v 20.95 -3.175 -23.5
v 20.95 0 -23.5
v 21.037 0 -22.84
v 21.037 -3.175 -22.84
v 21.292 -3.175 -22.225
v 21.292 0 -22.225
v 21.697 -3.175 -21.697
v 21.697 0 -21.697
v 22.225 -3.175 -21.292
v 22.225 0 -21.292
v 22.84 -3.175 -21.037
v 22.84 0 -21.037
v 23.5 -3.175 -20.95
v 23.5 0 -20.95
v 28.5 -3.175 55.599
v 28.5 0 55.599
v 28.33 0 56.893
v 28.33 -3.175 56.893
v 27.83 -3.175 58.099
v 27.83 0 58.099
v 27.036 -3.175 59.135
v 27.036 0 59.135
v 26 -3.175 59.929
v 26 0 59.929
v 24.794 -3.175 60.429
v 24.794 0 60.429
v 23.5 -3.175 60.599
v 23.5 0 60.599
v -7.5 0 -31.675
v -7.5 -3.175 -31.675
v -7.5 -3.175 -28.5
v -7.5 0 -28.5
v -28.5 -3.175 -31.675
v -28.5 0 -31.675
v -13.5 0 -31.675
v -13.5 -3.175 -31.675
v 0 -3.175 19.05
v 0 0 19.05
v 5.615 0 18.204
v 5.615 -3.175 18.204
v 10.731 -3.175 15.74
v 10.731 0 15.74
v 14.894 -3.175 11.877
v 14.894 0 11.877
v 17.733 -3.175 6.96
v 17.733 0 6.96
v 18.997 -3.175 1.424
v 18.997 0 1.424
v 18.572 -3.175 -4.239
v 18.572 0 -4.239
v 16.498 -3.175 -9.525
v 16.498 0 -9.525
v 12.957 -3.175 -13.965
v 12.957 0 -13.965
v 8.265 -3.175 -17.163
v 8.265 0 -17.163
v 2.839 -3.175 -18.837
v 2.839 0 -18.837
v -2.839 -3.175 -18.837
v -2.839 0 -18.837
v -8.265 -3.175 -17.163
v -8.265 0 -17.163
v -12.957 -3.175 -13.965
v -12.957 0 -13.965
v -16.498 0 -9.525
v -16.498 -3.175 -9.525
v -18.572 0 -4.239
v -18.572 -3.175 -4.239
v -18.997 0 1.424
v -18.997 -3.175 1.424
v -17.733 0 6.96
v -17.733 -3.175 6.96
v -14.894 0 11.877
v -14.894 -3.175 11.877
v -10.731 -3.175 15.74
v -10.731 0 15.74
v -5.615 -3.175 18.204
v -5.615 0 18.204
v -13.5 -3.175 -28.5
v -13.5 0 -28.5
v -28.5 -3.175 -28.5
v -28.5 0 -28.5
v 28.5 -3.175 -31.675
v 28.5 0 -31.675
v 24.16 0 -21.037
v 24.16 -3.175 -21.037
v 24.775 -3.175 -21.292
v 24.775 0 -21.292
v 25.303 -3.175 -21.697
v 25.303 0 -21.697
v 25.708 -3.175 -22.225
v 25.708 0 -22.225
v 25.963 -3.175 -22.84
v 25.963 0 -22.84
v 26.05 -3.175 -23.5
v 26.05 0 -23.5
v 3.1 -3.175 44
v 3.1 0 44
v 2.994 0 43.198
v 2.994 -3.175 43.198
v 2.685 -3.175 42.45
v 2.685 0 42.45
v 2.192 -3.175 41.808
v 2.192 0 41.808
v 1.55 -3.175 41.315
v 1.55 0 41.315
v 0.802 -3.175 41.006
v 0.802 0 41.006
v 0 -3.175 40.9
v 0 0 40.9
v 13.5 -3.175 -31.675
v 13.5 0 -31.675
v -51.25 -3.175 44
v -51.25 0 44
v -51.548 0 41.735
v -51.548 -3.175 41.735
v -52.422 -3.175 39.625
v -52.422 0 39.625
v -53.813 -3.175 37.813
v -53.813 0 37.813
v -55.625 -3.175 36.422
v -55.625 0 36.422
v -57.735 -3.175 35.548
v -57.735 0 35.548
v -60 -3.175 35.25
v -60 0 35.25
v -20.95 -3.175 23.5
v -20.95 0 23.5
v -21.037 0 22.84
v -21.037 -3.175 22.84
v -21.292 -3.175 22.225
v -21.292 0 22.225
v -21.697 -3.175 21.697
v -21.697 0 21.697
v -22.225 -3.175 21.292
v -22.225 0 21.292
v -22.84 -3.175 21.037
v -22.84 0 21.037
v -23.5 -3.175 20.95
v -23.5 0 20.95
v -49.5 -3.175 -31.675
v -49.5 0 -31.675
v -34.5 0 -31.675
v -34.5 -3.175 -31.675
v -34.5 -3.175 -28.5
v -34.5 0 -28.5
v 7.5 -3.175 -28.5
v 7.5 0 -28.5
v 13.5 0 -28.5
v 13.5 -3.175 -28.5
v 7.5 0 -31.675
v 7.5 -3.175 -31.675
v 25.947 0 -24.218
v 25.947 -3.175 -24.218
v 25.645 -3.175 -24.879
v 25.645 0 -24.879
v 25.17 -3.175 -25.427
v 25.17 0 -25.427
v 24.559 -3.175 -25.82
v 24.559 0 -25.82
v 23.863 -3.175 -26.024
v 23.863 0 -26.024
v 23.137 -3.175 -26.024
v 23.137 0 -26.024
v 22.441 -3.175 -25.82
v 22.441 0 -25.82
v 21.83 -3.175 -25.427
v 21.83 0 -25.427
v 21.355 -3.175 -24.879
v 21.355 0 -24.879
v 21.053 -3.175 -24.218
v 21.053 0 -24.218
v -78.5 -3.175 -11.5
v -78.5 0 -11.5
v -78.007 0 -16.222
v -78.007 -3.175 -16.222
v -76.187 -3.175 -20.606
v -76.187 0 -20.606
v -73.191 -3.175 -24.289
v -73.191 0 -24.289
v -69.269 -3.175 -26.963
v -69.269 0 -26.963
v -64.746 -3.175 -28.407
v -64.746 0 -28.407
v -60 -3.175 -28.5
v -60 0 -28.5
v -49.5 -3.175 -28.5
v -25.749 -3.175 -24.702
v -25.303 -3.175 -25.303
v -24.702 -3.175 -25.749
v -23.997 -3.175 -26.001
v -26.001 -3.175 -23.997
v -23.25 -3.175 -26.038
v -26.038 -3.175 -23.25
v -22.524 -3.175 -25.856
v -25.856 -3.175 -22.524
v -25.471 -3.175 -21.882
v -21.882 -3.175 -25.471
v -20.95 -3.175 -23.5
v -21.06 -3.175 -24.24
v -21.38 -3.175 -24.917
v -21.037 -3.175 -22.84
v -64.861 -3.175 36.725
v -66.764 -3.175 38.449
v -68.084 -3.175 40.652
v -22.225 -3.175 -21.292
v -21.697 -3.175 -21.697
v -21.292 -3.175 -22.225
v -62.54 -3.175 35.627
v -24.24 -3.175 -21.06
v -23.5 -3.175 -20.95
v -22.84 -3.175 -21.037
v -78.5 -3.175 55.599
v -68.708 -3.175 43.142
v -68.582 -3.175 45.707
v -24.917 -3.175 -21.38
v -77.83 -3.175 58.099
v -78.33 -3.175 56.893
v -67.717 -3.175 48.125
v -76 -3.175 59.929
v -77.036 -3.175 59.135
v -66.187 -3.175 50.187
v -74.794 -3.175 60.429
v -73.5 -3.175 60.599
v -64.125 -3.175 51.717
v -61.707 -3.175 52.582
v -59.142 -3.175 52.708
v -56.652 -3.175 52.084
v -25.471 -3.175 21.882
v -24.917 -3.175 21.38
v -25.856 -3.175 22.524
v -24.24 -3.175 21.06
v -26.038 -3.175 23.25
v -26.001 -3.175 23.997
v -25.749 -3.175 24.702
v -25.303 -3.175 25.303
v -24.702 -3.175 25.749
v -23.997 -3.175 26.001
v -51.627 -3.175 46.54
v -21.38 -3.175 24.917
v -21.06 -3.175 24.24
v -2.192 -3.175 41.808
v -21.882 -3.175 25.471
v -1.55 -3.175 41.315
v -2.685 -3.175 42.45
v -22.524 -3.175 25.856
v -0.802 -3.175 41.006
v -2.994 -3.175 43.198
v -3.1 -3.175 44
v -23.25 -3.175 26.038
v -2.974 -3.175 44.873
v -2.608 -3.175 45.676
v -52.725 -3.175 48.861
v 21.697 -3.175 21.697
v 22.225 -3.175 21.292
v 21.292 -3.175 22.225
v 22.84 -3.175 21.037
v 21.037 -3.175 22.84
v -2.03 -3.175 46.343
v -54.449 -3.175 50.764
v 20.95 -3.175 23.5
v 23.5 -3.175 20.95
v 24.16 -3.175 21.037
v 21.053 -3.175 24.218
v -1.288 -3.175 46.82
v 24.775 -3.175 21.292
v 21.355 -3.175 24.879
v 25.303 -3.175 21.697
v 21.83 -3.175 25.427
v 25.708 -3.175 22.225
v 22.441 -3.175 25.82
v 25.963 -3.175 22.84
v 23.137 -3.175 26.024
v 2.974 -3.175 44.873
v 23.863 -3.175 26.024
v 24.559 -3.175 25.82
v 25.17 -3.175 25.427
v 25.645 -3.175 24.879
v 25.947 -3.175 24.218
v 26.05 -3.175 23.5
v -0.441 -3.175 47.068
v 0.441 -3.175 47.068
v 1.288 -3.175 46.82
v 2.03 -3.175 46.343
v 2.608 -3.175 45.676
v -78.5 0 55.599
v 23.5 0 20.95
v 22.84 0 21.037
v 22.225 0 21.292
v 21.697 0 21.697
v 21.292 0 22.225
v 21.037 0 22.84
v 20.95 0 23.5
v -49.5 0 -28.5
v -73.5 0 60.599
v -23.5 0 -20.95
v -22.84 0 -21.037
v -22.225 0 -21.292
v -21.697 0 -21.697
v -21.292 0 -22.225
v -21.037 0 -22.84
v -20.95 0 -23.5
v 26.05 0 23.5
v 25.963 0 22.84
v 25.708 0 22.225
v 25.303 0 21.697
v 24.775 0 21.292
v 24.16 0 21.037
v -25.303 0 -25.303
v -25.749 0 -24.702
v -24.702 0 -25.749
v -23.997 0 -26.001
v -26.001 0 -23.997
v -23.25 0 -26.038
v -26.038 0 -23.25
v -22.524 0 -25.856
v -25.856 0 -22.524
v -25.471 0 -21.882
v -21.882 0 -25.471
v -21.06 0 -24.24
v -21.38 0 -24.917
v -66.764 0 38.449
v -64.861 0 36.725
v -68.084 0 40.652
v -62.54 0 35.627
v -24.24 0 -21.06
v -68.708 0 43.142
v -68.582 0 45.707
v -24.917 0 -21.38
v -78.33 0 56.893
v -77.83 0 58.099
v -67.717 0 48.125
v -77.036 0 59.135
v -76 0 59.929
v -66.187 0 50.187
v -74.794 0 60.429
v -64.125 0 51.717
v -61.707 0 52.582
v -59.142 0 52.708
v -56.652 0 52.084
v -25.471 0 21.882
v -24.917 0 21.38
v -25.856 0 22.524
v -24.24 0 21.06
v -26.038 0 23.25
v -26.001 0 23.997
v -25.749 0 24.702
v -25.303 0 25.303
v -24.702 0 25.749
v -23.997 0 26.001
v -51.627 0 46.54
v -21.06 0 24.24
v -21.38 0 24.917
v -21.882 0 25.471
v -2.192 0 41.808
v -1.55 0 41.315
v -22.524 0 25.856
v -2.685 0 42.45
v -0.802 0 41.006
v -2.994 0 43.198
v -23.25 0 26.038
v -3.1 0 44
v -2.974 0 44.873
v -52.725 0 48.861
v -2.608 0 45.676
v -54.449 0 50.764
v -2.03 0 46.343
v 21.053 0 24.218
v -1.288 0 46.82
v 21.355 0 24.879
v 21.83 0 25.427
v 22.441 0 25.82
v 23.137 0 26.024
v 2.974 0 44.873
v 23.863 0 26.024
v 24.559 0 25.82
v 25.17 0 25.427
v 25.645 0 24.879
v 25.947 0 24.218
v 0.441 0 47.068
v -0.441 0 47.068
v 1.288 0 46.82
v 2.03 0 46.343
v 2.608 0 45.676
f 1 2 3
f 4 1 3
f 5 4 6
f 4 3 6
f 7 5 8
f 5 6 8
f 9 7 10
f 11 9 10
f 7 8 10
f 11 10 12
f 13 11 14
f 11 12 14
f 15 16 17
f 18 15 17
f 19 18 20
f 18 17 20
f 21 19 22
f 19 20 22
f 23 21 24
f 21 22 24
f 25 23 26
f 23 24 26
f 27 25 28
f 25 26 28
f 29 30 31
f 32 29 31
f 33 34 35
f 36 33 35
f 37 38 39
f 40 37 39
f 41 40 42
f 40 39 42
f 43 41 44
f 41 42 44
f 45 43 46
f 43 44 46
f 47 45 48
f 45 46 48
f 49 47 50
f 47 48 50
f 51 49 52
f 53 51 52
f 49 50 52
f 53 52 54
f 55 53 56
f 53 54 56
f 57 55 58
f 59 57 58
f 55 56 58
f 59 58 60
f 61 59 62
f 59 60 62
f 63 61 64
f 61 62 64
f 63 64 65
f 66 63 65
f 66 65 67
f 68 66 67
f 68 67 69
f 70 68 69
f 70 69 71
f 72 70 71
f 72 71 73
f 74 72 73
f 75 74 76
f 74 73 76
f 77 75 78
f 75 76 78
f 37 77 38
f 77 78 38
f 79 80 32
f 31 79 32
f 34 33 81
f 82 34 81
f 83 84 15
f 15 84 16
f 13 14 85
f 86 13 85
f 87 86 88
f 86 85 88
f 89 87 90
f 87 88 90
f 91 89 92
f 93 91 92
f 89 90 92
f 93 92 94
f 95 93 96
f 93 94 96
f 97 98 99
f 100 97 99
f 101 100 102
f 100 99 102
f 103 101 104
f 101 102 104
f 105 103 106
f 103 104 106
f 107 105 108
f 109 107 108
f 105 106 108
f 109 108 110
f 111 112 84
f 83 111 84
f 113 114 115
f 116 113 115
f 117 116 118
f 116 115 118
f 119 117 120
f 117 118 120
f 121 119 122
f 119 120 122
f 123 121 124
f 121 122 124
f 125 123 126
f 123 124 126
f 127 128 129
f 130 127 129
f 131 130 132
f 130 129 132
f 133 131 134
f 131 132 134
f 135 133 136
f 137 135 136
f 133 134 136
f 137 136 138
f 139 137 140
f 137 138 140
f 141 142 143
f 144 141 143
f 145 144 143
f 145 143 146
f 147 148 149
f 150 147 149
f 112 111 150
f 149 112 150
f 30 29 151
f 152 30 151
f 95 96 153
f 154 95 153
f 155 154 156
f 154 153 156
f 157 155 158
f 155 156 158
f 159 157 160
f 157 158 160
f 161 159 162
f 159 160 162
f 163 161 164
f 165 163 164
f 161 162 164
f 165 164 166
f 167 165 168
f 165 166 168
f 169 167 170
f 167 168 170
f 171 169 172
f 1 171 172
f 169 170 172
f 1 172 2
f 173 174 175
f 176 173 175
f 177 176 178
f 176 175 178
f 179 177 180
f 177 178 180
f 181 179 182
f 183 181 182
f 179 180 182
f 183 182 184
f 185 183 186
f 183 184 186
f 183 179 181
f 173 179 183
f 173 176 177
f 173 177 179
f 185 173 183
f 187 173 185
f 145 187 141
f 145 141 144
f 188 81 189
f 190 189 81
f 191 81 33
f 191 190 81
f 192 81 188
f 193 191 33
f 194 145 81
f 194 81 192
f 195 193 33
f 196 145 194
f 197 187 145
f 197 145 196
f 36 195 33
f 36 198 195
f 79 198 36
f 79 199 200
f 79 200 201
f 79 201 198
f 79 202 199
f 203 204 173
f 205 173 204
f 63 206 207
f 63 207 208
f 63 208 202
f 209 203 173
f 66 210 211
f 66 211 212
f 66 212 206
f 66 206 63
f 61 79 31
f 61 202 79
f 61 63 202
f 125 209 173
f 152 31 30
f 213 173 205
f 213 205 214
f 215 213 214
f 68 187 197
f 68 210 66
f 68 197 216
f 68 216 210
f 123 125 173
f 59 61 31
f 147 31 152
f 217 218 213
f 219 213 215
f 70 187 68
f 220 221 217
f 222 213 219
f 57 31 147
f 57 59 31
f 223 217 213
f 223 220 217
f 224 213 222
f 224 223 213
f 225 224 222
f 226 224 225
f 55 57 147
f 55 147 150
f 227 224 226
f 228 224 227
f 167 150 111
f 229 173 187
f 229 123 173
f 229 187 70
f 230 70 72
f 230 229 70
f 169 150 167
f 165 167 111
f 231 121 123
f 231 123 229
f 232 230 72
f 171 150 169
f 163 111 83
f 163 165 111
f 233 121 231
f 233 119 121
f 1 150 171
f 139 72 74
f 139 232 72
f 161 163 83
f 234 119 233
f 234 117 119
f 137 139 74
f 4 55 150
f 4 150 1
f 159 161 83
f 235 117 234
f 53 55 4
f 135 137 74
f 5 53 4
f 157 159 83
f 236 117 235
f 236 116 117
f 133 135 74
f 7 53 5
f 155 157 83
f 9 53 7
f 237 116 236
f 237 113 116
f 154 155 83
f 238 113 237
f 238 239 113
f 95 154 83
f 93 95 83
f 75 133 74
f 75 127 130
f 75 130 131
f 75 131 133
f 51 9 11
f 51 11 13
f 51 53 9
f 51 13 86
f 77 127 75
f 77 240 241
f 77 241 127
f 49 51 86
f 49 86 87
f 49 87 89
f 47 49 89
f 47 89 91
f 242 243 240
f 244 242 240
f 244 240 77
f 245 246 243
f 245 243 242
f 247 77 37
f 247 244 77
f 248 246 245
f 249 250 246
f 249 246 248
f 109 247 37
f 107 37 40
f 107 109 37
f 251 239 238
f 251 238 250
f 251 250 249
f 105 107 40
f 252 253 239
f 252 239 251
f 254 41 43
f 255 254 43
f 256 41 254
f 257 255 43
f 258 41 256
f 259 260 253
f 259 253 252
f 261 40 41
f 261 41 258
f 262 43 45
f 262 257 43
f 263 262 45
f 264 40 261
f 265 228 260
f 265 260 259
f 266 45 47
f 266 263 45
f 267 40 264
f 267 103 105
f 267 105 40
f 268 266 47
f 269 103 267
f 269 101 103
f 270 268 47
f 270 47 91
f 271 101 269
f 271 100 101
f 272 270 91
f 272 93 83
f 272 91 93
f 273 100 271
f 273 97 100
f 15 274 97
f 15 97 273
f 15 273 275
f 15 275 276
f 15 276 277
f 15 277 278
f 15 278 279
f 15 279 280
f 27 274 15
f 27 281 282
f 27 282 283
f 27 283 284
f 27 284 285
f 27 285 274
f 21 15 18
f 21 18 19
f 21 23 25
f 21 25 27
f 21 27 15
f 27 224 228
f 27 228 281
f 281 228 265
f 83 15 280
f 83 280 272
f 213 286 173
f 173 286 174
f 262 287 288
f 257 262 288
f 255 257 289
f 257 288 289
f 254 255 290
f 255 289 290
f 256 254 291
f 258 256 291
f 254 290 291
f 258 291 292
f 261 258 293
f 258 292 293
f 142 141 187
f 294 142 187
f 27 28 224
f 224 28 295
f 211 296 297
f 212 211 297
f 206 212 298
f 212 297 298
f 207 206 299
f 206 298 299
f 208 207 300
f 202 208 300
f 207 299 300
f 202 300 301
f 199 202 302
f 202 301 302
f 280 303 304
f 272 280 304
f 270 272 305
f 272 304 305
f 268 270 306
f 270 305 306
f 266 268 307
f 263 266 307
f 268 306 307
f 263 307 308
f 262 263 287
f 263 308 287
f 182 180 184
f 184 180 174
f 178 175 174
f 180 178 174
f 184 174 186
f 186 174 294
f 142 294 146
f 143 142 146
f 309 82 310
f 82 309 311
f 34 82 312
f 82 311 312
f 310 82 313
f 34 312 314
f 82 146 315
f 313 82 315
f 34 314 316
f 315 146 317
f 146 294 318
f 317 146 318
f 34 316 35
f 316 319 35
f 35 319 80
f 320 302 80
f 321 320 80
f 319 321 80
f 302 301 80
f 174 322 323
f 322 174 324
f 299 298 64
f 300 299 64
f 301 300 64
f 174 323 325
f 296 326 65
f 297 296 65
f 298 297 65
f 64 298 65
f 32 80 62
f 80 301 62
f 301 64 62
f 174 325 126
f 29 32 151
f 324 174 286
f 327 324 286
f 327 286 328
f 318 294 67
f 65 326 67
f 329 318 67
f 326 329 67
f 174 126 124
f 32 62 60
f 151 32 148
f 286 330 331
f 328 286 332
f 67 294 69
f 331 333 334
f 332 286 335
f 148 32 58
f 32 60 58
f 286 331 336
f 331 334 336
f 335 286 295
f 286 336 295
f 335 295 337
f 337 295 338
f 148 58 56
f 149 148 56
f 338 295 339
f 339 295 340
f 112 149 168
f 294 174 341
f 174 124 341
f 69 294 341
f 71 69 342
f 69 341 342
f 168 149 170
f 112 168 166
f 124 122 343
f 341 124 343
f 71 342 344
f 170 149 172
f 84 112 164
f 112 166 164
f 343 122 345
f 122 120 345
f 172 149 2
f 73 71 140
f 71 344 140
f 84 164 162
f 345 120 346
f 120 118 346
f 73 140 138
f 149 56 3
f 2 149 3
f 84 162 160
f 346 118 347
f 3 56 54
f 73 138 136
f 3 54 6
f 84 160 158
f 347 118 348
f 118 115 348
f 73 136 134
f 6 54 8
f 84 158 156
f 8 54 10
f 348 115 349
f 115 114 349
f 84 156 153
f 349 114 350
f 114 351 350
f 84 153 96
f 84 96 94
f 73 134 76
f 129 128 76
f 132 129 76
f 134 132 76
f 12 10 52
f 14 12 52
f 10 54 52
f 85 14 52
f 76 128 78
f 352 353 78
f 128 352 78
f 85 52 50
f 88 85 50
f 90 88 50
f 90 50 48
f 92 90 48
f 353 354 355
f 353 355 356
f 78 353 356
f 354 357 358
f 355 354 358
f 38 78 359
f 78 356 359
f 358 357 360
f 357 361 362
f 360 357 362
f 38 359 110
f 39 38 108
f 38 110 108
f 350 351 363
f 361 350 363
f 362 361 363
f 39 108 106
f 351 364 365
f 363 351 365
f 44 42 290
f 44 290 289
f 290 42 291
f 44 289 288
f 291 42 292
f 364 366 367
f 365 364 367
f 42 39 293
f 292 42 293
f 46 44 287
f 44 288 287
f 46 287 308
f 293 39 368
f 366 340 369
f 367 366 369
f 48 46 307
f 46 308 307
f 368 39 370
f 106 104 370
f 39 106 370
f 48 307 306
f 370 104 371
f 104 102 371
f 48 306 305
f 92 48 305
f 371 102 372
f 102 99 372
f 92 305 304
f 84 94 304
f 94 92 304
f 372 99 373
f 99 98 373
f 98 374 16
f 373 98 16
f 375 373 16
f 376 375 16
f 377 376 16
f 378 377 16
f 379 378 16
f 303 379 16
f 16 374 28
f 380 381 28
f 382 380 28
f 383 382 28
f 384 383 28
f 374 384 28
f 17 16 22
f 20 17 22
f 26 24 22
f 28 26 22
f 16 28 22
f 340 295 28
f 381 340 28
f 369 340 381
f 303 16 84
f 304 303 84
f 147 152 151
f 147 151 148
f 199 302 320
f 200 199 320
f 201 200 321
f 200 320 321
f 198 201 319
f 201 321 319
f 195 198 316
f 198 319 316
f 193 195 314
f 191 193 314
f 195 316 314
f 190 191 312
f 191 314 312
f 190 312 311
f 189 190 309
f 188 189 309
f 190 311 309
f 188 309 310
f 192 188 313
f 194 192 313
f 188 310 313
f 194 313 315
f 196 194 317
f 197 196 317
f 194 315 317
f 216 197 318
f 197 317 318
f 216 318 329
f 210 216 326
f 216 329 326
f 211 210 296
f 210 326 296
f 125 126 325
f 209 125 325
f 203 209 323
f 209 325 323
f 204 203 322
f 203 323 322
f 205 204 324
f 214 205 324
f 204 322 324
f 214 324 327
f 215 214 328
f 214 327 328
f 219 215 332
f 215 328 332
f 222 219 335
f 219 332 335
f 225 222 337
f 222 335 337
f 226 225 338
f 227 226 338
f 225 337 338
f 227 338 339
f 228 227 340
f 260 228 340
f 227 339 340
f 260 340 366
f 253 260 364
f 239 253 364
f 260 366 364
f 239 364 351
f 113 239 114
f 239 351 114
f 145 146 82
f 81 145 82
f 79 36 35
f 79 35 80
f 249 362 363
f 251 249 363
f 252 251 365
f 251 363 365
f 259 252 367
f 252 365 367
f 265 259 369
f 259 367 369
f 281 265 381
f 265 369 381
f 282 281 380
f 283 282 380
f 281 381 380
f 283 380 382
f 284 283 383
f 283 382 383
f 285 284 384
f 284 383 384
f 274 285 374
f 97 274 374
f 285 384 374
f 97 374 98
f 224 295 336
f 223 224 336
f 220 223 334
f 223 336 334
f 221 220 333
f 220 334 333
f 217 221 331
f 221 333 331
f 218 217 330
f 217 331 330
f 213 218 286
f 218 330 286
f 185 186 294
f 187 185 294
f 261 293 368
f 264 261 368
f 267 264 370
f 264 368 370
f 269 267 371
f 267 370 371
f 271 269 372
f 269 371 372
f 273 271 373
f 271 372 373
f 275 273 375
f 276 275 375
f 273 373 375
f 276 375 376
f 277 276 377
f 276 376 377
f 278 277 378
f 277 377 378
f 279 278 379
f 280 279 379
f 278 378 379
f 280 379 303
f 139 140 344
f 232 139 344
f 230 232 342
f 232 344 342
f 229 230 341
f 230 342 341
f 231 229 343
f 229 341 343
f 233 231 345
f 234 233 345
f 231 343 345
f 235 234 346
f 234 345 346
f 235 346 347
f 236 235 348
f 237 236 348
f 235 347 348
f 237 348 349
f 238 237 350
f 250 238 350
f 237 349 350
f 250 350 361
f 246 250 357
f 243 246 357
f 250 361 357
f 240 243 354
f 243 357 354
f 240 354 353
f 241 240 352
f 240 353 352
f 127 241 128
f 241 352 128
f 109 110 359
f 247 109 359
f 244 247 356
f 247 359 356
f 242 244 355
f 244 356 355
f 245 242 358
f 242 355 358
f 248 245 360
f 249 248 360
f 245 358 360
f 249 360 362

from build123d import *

# Parameters (mm, degrees)
F0_W     = 15
F0_H     = 3.175
F0_W_2   = 7.5
F1_DEPTH = 3.175


# Not quite as in the source:
# - a feature names something its author has since deleted; it is built from what else it names


with BuildPart() as f1:
    # F0 (on Front) → F1 (new body)
    with BuildSketch(Plane.XZ):
        Polygon((0, 28.5), (-28.5, 28.5), (-28.5, -28.5), (-13.5, -28.5), (-7.5, -28.5), (0, -28.5), (7.5, -28.5), (13.5, -28.5), (28.5, -28.5), (28.5, 23.5), (28.5, 28.5), (23.5, 28.5), align=None)
        with BuildLine():
            Line((-20.95, 23.5), (0, 23.5))
            Line((0, 23.5), (20.95, 23.5))
            ThreePointArc((20.95, 23.5), (23.5, 26.05), (26.05, 23.5))
            ThreePointArc((26.05, 23.5), (25.303122292, 21.696877708), (23.5, 20.95))
            Line((23.5, 20.95), (23.5, -20.95))
            ThreePointArc((23.5, -20.95), (25.303122292, -21.696877708), (26.05, -23.5))
            ThreePointArc((26.05, -23.5), (23.5, -26.05), (20.95, -23.5))
            Line((20.95, -23.5), (-20.95, -23.5))
            ThreePointArc((-20.95, -23.5), (-25.303122292, -25.303122292), (-23.5, -20.95))
            Line((-23.5, -20.95), (-23.5, 20.95))
            ThreePointArc((-23.5, 20.95), (-25.303122292, 25.303122292), (-20.95, 23.5))
        make_face(mode=Mode.SUBTRACT)
        with BuildLine():
            Line((-28.5, -28.5), (-28.5, 28.5))
            Line((-28.5, 28.5), (-28.5, 44))
            Line((-28.5, 44), (-51.25, 44))
            ThreePointArc((-51.25, 44), (-53.8128156646, 37.8128156646), (-60, 35.25))
            Line((-60, 35.25), (-60, -28.5))
            Line((-60, -28.5), (-49.5, -28.5))
            Line((-49.5, -28.5), (-34.5, -28.5))
            Line((-34.5, -28.5), (-28.5, -28.5))
        make_face()
        with BuildLine():
            Line((20.95, 23.5), (0, 23.5))
            Line((0, 23.5), (-20.95, 23.5))
            ThreePointArc((-20.95, 23.5), (-21.696877708, 21.696877708), (-23.5, 20.95))
            Line((-23.5, 20.95), (-23.5, -20.95))
            ThreePointArc((-23.5, -20.95), (-21.696877708, -21.696877708), (-20.95, -23.5))
            Line((-20.95, -23.5), (20.95, -23.5))
            ThreePointArc((20.95, -23.5), (21.696877708, -21.696877708), (23.5, -20.95))
            Line((23.5, -20.95), (23.5, 20.95))
            ThreePointArc((23.5, 20.95), (21.696877708, 21.696877708), (20.95, 23.5))
        make_face()
        with BuildLine():
            ThreePointArc((19.05, 0), (-13.4703841816, -13.4703841816), (0, 19.05))
            ThreePointArc((0, 19.05), (13.4703841816, 13.4703841816), (19.05, 0))
        make_face(mode=Mode.SUBTRACT)
        with BuildLine():
            Line((-51.25, 44), (-28.5, 44))
            Line((-28.5, 44), (-28.5, 60.5991594493))
            Line((-28.5, 60.5991594493), (-73.5, 60.5991594493))
            ThreePointArc((-73.5, 60.5991594493), (-77.0355339059, 59.1346933553), (-78.5, 55.5991594493))
            Line((-78.5, 55.5991594493), (-78.5, -11.5))
            ThreePointArc((-78.5, -11.5), (-73.1911039749, -24.2888484433), (-60, -28.5))
            Line((-60, -28.5), (-60, 35.25))
            ThreePointArc((-60, 35.25), (-66.1871843354, 50.1871843354), (-51.25, 44))
        make_face()
        with BuildLine():
            Line((0, 40.9), (0, 28.5))
            Line((0, 28.5), (23.5, 28.5))
            Line((23.5, 28.5), (28.5, 28.5))
            Line((28.5, 28.5), (28.5, 55.5991594493))
            ThreePointArc((28.5, 55.5991594493), (27.0355339059, 59.1346933553), (23.5, 60.5991594493))
            Line((23.5, 60.5991594493), (-28.5, 60.5991594493))
            Line((-28.5, 60.5991594493), (-28.5, 44))
            Line((-28.5, 44), (-3.1, 44))
            ThreePointArc((-3.1, 44), (0, 47.1), (3.1, 44))
            ThreePointArc((3.1, 44), (2.1920310217, 41.8079689783), (0, 40.9))
        make_face()
        with BuildLine():
            Line((-28.5, 44), (-28.5, 28.5))
            Line((-28.5, 28.5), (0, 28.5))
            Line((0, 28.5), (0, 40.9))
            ThreePointArc((0, 40.9), (-2.1920310217, 41.8079689783), (-3.1, 44))
            Line((-3.1, 44), (-28.5, 44))
        make_face()
        with Locations((21, -30.0875)):
            Rectangle(F0_W, F0_H)
        with Locations((-21, -30.0875)):
            Rectangle(F0_W, F0_H)
        with Locations((-42, -30.0875)):
            Rectangle(F0_W, F0_H)
        with Locations((3.75, -30.0875)):
            Rectangle(F0_W_2, F0_H)
        with Locations((-3.75, -30.0875)):
            Rectangle(F0_W_2, F0_H)
    extrude(amount=F1_DEPTH)


solid = f1.part
